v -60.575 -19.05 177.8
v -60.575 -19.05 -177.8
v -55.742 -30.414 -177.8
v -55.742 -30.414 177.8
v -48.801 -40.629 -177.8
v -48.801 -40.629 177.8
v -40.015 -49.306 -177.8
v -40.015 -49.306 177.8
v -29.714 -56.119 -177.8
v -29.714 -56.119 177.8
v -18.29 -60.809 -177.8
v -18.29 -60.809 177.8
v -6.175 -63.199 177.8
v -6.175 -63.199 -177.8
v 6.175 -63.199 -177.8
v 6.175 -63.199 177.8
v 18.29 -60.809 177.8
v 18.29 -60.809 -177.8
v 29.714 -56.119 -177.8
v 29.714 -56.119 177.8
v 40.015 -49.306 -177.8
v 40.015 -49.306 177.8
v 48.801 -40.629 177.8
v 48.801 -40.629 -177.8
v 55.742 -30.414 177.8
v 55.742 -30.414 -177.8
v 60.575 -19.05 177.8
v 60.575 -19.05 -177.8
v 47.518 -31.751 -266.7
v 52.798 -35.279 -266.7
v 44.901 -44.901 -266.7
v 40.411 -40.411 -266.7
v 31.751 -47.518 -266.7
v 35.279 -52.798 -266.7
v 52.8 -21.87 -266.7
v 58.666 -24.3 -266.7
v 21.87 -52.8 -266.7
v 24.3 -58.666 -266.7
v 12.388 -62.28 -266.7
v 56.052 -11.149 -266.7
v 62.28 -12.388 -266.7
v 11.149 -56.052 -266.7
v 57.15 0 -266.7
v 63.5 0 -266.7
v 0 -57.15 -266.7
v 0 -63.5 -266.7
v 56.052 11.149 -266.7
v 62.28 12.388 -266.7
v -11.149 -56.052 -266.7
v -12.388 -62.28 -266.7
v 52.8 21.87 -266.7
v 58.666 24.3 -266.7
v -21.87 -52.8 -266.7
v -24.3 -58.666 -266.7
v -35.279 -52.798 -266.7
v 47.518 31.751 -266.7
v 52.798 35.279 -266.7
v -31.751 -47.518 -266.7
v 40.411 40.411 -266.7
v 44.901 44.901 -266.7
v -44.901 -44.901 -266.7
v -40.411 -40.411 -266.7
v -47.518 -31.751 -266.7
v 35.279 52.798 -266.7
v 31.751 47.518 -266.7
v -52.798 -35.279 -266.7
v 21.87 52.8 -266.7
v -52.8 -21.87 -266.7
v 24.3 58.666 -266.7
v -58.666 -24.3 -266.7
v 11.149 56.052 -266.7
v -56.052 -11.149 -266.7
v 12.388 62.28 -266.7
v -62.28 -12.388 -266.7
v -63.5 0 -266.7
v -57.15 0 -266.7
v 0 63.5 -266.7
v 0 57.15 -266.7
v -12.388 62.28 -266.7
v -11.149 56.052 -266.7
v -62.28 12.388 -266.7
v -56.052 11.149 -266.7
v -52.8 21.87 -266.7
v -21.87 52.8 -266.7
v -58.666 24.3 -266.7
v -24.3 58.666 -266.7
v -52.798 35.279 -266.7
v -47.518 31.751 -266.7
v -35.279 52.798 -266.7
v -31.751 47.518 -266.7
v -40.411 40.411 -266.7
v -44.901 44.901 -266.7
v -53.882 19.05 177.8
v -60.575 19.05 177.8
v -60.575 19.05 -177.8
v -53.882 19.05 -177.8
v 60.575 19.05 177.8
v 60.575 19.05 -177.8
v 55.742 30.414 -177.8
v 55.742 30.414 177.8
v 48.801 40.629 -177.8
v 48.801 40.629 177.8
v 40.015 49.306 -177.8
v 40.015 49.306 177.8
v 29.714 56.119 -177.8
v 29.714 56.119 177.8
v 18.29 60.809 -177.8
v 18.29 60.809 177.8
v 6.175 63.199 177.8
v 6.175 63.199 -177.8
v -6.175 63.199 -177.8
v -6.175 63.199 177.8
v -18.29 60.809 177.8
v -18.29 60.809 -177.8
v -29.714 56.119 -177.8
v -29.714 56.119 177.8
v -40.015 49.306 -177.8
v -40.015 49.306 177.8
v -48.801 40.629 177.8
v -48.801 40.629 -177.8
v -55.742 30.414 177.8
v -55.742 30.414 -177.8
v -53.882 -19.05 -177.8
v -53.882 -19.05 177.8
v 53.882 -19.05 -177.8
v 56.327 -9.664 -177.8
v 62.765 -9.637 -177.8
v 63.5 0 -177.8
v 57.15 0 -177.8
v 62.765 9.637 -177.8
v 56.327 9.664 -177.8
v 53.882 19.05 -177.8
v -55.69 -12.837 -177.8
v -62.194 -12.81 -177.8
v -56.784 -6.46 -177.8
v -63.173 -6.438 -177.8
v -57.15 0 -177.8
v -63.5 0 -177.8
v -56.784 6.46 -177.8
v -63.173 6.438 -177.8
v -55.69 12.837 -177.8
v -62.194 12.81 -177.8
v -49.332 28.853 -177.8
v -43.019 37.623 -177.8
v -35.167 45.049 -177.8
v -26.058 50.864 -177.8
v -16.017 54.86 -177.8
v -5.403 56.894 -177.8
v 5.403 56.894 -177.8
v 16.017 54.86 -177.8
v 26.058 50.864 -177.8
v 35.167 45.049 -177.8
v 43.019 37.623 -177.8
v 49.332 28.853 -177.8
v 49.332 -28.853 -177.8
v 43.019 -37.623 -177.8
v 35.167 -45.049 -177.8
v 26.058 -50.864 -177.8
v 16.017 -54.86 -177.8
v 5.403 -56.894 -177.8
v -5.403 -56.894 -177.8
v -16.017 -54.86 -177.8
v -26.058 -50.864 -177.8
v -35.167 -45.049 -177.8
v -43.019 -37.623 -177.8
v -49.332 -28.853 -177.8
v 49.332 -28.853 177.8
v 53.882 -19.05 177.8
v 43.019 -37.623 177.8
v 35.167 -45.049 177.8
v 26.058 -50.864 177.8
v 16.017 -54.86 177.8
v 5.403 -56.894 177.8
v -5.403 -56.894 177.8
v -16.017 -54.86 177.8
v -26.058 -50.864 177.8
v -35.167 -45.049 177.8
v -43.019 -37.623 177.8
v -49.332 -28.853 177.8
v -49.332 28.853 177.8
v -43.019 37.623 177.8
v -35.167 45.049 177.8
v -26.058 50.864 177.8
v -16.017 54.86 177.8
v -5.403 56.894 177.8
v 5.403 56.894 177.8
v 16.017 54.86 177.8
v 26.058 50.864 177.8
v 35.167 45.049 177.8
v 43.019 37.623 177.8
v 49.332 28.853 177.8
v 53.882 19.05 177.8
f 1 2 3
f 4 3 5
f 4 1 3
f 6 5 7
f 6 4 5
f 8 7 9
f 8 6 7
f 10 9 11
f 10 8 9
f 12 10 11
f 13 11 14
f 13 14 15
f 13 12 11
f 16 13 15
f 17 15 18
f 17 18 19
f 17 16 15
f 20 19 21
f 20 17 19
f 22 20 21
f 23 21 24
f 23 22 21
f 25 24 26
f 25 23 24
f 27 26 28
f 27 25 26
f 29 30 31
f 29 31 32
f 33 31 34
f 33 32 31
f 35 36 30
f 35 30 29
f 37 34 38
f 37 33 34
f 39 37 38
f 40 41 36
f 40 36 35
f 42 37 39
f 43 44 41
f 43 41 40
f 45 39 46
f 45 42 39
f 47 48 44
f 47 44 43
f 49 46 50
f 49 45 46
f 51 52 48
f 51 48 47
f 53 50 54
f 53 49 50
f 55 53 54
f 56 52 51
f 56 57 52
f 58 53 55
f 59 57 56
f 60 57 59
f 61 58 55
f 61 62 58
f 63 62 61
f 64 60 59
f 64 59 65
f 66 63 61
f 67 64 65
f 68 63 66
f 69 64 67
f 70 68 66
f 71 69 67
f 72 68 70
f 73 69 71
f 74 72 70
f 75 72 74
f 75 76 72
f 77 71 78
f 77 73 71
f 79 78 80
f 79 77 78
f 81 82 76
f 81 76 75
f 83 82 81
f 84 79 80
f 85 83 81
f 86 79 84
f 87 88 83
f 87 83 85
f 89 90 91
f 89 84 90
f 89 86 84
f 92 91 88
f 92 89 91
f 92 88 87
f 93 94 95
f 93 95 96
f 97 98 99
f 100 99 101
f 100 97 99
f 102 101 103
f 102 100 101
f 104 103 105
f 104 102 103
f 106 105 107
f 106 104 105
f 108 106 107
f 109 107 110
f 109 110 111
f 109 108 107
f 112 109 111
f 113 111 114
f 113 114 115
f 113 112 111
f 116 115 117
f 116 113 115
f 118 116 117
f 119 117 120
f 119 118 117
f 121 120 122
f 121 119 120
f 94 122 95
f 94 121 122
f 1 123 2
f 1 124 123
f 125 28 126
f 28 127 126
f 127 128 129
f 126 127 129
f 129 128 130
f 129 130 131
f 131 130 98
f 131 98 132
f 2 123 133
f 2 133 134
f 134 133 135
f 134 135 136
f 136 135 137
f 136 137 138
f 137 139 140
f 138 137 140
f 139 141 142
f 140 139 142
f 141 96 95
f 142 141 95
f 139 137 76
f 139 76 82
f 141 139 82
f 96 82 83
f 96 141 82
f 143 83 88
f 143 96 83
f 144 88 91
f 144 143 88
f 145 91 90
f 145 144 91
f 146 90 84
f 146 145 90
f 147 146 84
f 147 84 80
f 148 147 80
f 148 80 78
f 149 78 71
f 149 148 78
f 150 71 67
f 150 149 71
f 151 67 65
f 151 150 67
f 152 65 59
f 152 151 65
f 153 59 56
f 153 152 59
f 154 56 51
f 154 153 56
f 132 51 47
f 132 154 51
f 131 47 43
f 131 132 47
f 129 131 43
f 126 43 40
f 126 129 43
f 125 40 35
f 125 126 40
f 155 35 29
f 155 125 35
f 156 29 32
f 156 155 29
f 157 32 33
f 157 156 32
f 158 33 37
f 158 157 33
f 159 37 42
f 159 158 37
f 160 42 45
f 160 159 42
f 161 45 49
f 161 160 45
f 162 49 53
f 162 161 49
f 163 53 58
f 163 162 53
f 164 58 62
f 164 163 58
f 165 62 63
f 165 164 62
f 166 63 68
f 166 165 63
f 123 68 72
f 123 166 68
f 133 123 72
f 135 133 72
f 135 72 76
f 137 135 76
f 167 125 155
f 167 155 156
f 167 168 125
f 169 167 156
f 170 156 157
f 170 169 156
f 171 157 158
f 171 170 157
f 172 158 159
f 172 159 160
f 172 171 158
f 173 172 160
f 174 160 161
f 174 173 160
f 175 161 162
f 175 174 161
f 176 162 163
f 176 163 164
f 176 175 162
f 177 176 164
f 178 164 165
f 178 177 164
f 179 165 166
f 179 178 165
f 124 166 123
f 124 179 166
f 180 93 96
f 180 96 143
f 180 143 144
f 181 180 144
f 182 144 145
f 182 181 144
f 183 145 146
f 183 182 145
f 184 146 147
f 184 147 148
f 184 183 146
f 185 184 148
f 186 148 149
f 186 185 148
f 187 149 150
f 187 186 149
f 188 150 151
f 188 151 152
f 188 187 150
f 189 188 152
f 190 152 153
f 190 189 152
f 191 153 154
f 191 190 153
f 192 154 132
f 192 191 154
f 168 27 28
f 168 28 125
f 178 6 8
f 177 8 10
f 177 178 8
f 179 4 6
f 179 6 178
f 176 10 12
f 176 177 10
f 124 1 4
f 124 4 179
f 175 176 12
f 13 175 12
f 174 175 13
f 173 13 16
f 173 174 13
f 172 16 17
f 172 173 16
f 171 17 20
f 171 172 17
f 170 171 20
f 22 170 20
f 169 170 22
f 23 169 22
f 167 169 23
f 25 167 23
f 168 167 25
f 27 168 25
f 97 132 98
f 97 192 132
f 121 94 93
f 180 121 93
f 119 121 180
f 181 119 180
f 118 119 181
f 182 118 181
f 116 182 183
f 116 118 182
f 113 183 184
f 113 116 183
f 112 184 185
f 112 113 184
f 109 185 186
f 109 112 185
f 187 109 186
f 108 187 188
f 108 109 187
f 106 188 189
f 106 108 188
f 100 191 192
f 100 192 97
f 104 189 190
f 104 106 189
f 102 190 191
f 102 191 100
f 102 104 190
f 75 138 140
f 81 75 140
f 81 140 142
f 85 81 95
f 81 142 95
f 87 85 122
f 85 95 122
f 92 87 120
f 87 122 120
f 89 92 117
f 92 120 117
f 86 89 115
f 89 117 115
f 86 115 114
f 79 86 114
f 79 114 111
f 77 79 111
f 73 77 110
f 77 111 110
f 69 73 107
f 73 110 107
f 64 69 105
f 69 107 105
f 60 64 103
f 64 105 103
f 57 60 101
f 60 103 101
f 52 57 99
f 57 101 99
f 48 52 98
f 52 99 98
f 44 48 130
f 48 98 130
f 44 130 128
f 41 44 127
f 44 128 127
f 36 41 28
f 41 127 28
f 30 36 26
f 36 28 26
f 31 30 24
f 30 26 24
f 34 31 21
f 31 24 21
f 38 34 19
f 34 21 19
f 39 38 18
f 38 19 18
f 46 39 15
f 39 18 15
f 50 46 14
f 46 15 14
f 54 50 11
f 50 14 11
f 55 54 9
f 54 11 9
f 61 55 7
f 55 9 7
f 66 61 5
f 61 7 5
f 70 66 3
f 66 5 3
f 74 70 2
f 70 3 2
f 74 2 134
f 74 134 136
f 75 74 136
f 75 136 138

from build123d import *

# Parameters (mm, degrees)
BOSS_EXTRUDE1_DEPTH   = 177.8
BOSS_EXTRUDE1_2_DEPTH = 177.8
SKETCH2_R             = 63.5
SKETCH2_R_2           = 57.15
BOSS_EXTRUDE2_DEPTH   = 88.9


with BuildPart() as part:
    # Sketch1 → Boss-Extrude1 (new body, symmetric)
    with BuildSketch(Plane.XY):
        with BuildLine():
            ThreePointArc((60.575139, 19.05), (0, 63.5), (-60.575139, 19.05))
            Line((-60.575139, 19.05), (-53.881537, 19.05))
            ThreePointArc((-53.881537, 19.05), (0, 57.15), (53.881537, 19.05))
            Line((53.881537, 19.05), (60.575139, 19.05))
        make_face()
    extrude(amount=BOSS_EXTRUDE1_DEPTH, both=True)



with BuildPart() as body_2:
    # Sketch1 → Boss-Extrude1 2 (new body, symmetric)
    with BuildSketch(Plane.XY):
        with BuildLine():
            Line((-53.881537, -19.05), (-60.575139, -19.05))
            ThreePointArc((-60.575139, -19.05), (0, -63.5), (60.575139, -19.05))
            Line((60.575139, -19.05), (53.881537, -19.05))
            ThreePointArc((53.881537, -19.05), (0, -57.15), (-53.881537, -19.05))
        make_face()
    extrude(amount=BOSS_EXTRUDE1_2_DEPTH, both=True)


with BuildPart() as part_1:
    add(part.part)

    add(body_2.part)  # Boss-Extrude2 merges body 2
    # Sketch2 → Boss-Extrude2 (add)
    with BuildSketch(Plane(origin=(0, 0, -177.8), x_dir=(-1, 0, 0), z_dir=(0, 0, -1))):
        Circle(SKETCH2_R)
        Circle(SKETCH2_R_2, mode=Mode.SUBTRACT)
    extrude(amount=BOSS_EXTRUDE2_DEPTH)


solid = part_1.part
